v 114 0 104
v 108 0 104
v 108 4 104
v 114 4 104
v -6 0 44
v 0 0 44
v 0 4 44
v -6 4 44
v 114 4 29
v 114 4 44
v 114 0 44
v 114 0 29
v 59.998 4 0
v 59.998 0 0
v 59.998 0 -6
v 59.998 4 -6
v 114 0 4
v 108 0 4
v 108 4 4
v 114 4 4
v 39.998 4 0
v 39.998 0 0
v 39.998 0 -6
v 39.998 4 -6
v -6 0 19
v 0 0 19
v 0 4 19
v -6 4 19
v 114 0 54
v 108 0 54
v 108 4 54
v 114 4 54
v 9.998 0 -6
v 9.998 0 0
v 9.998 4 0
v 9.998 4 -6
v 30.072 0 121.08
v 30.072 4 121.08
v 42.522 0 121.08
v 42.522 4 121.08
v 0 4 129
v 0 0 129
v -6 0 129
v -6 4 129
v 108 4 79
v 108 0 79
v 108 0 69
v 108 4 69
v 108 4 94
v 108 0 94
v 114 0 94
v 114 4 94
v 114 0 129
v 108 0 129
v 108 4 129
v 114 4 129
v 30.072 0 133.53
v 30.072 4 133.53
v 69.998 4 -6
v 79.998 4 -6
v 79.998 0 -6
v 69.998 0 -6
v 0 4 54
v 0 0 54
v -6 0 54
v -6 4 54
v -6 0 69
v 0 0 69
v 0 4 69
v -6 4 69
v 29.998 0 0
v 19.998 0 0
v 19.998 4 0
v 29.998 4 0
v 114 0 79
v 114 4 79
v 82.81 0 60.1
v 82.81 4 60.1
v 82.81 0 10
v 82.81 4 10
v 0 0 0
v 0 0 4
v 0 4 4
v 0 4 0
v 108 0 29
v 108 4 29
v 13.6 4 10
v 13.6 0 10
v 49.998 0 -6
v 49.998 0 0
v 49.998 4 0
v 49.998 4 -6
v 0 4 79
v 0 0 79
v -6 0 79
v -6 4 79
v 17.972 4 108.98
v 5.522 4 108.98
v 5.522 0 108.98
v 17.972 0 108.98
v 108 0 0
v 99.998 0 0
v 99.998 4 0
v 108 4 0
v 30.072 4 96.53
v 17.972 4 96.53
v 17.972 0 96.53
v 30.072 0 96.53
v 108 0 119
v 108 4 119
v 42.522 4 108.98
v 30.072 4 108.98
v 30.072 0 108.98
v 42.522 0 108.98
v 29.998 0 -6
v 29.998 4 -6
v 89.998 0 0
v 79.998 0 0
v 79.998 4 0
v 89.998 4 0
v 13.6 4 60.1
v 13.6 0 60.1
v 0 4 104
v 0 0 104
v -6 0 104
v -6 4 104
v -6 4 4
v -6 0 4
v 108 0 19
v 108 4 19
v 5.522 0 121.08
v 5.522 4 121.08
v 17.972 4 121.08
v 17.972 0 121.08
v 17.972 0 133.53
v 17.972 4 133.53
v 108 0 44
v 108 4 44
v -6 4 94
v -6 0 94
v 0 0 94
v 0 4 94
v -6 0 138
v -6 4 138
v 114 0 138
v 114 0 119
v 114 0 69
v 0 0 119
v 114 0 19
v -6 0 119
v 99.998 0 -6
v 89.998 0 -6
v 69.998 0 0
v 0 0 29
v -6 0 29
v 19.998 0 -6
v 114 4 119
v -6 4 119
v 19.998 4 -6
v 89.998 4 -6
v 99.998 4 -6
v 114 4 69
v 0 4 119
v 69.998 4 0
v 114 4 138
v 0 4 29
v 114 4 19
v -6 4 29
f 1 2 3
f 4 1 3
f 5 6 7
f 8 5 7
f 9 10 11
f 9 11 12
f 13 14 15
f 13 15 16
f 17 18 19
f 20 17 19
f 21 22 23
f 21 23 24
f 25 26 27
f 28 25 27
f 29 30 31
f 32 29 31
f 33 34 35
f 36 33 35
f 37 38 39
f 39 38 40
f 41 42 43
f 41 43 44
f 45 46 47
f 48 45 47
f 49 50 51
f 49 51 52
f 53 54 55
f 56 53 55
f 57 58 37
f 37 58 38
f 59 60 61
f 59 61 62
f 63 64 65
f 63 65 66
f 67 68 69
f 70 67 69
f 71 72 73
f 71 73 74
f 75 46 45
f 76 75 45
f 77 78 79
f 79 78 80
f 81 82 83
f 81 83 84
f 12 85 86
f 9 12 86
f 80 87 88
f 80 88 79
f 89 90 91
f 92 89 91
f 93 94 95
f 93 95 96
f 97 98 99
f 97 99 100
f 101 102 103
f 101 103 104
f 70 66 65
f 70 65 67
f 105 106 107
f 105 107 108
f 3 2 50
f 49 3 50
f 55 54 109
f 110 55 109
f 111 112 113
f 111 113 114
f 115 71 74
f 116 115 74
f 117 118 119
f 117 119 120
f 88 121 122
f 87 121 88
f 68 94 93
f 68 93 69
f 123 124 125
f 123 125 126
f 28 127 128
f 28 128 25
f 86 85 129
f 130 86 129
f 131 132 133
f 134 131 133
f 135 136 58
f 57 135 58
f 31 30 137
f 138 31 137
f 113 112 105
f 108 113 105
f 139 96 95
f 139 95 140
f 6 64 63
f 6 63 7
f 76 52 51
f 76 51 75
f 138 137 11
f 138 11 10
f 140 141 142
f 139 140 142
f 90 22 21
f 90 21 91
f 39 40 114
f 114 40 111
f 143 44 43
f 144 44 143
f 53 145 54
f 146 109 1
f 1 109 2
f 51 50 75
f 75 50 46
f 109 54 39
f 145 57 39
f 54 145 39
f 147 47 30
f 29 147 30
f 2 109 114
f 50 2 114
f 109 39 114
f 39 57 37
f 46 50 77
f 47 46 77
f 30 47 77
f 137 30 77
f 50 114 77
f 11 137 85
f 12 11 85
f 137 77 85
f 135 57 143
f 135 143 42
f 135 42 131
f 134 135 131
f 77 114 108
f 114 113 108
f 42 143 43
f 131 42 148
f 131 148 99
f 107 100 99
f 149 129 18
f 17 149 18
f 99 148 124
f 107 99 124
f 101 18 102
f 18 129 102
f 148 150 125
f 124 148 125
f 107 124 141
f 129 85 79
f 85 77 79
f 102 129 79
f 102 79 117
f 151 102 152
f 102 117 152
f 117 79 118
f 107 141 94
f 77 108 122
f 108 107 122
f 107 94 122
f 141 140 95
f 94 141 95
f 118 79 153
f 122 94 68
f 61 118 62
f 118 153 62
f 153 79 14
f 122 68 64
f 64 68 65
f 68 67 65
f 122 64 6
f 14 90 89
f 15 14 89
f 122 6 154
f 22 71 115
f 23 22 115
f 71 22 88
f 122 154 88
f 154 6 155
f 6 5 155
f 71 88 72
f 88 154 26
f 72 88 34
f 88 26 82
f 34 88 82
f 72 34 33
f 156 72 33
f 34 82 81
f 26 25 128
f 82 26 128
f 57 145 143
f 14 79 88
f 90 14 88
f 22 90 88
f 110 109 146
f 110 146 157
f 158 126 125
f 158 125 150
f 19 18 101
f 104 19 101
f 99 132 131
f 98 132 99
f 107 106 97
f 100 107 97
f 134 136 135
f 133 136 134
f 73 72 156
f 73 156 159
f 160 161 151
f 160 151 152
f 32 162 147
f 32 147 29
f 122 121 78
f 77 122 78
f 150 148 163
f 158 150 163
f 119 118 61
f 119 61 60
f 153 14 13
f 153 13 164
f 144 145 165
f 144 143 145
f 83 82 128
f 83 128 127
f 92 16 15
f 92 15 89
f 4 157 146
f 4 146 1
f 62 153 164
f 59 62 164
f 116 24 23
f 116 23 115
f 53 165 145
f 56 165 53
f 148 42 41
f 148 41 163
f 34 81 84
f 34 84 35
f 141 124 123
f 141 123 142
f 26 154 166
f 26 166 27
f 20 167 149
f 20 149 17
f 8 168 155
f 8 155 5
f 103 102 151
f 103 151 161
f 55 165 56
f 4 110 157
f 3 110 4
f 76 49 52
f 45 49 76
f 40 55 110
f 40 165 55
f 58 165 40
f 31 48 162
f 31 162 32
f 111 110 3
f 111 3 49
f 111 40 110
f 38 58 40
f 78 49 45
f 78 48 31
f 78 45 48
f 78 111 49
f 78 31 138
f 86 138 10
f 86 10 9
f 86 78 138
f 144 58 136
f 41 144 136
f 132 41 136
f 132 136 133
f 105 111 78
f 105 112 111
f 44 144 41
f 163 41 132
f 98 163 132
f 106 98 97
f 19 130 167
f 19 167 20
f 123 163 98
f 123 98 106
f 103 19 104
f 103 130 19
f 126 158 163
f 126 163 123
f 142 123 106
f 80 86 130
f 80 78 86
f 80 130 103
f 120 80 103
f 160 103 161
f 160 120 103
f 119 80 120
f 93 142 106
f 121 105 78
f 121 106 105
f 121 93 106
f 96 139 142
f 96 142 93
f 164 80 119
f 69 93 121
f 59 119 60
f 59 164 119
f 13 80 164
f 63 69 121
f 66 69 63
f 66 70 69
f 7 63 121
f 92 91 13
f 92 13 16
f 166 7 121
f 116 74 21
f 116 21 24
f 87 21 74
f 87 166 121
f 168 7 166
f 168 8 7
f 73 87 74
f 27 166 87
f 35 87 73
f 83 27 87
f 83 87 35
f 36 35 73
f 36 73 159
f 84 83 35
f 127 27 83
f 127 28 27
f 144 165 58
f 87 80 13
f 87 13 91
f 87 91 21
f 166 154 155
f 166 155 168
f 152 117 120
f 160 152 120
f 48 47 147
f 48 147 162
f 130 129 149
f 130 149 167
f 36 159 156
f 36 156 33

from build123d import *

# Parameters (mm, degrees)
SKETCH_1_W          = 108
SKETCH_1_H          = 138
EXTRUDE_1_DEPTH     = 4
SKETCH_2_W          = 69.21
SKETCH_2_H          = 50.1
CUT_EXTRUDE_1_DEPTH = 176.282628917
SKETCH_3_W          = 12.1
SKETCH_3_H          = 12.1
SKETCH_3_H_2        = 12.45
SKETCH_3_W_2        = 12.45
CUT_EXTRUDE_2_DEPTH = 176.282628917
SKETCH_4_W          = 15
SKETCH_4_H          = 4
EXTRUDE_2_DEPTH     = 6
SKETCH_6_W          = 9
SKETCH_6_H          = 4
EXTRUDE_3_DEPTH     = 6
SKETCH_7_W          = 15
SKETCH_7_H          = 4
EXTRUDE_4_DEPTH     = 6
SKETCH_8_W          = 9
SKETCH_8_H          = 4
EXTRUDE_5_DEPTH     = 6
SKETCH_9_W          = 10
SKETCH_9_H          = 4
EXTRUDE_6_DEPTH     = 6


with BuildPart() as part:
    # Эскиз1 → Бобышка-Вытянуть1 (new body)
    with BuildSketch(Plane(origin=(0, 0, 0), x_dir=(1, 0, 0), z_dir=(0, 1, 0))):
        with Locations((54, -69)):
            Rectangle(SKETCH_1_W, SKETCH_1_H)
    extrude(amount=EXTRUDE_1_DEPTH)

    # Эскиз2 → Вырез-Вытянуть1 (cut, through all)
    with BuildSketch(Plane(origin=(0, 4, 0), x_dir=(1, 0, 0), z_dir=(0, 1, 0))):
        with Locations((48.205, -35.05)):
            Rectangle(SKETCH_2_W, SKETCH_2_H)
    extrude(amount=-CUT_EXTRUDE_1_DEPTH, mode=Mode.SUBTRACT)

    # Эскиз3 → Вырез-Вытянуть2 (cut, through all)
    with BuildSketch(Plane(origin=(0, 4, 0), x_dir=(1, 0, 0), z_dir=(0, 1, 0))):
        with Locations((24.022320969, -115.030109588)):
            Rectangle(SKETCH_3_W, SKETCH_3_H)
        with Locations((24.022320969, -102.755109588)):
            Rectangle(SKETCH_3_W, SKETCH_3_H_2)
        with Locations((11.747320969, -115.030109588)):
            Rectangle(SKETCH_3_W_2, SKETCH_3_H)
        with Locations((36.297320969, -115.030109588)):
            Rectangle(SKETCH_3_W_2, SKETCH_3_H)
        with Locations((24.022320969, -127.305109588)):
            Rectangle(SKETCH_3_W, SKETCH_3_H_2)
    extrude(amount=-CUT_EXTRUDE_2_DEPTH, mode=Mode.SUBTRACT)

    # Эскиз4 → Бобышка-Вытянуть2 (add)
    with BuildSketch(Plane.ZY):
        with Locations((11.5, 2)):
            Rectangle(SKETCH_4_W, SKETCH_4_H)
        with Locations((36.5, 2)):
            Rectangle(SKETCH_4_W, SKETCH_4_H)
        with Locations((61.5, 2)):
            Rectangle(SKETCH_4_W, SKETCH_4_H)
        with Locations((86.5, 2)):
            Rectangle(SKETCH_4_W, SKETCH_4_H)
        with Locations((111.5, 2)):
            Rectangle(SKETCH_4_W, SKETCH_4_H)
    extrude(amount=EXTRUDE_2_DEPTH)

    # Эскиз6 → Бобышка-Вытянуть3 (add)
    with BuildSketch(Plane.ZY):
        with Locations((133.5, 2)):
            Rectangle(SKETCH_6_W, SKETCH_6_H)
    extrude(amount=EXTRUDE_3_DEPTH)

    # Эскиз7 → Бобышка-Вытянуть4 (add)
    with BuildSketch(Plane(origin=(108, 0, 0), x_dir=(0, 0, -1), z_dir=(1, 0, 0))):
        with Locations((-11.5, 2)):
            Rectangle(SKETCH_7_W, SKETCH_7_H)
        with Locations((-36.5, 2)):
            Rectangle(SKETCH_7_W, SKETCH_7_H)
        with Locations((-61.5, 2)):
            Rectangle(SKETCH_7_W, SKETCH_7_H)
        with Locations((-86.5, 2)):
            Rectangle(SKETCH_7_W, SKETCH_7_H)
        with Locations((-111.5, 2)):
            Rectangle(SKETCH_7_W, SKETCH_7_H)
    extrude(amount=EXTRUDE_4_DEPTH)

    # Эскиз8 → Бобышка-Вытянуть5 (add)
    with BuildSketch(Plane(origin=(108, 0, 0), x_dir=(0, 0, -1), z_dir=(1, 0, 0))):
        with Locations((-133.5, 2)):
            Rectangle(SKETCH_8_W, SKETCH_8_H)
    extrude(amount=EXTRUDE_5_DEPTH)

    # Эскиз9 → Бобышка-Вытянуть6 (add)
    with BuildSketch(Plane(origin=(0, 0, 0), x_dir=(-1, 0, 0), z_dir=(0, 0, -1))):
        with Locations((-94.998495411, 2)):
            Rectangle(SKETCH_9_W, SKETCH_9_H)
        with Locations((-74.998495411, 2)):
            Rectangle(SKETCH_9_W, SKETCH_9_H)
        with Locations((-54.998495411, 2)):
            Rectangle(SKETCH_9_W, SKETCH_9_H)
        with Locations((-34.998495411, 2)):
            Rectangle(SKETCH_9_W, SKETCH_9_H)
        with Locations((-14.998495411, 2)):
            Rectangle(SKETCH_9_W, SKETCH_9_H)
    extrude(amount=EXTRUDE_6_DEPTH)


solid = part.part
